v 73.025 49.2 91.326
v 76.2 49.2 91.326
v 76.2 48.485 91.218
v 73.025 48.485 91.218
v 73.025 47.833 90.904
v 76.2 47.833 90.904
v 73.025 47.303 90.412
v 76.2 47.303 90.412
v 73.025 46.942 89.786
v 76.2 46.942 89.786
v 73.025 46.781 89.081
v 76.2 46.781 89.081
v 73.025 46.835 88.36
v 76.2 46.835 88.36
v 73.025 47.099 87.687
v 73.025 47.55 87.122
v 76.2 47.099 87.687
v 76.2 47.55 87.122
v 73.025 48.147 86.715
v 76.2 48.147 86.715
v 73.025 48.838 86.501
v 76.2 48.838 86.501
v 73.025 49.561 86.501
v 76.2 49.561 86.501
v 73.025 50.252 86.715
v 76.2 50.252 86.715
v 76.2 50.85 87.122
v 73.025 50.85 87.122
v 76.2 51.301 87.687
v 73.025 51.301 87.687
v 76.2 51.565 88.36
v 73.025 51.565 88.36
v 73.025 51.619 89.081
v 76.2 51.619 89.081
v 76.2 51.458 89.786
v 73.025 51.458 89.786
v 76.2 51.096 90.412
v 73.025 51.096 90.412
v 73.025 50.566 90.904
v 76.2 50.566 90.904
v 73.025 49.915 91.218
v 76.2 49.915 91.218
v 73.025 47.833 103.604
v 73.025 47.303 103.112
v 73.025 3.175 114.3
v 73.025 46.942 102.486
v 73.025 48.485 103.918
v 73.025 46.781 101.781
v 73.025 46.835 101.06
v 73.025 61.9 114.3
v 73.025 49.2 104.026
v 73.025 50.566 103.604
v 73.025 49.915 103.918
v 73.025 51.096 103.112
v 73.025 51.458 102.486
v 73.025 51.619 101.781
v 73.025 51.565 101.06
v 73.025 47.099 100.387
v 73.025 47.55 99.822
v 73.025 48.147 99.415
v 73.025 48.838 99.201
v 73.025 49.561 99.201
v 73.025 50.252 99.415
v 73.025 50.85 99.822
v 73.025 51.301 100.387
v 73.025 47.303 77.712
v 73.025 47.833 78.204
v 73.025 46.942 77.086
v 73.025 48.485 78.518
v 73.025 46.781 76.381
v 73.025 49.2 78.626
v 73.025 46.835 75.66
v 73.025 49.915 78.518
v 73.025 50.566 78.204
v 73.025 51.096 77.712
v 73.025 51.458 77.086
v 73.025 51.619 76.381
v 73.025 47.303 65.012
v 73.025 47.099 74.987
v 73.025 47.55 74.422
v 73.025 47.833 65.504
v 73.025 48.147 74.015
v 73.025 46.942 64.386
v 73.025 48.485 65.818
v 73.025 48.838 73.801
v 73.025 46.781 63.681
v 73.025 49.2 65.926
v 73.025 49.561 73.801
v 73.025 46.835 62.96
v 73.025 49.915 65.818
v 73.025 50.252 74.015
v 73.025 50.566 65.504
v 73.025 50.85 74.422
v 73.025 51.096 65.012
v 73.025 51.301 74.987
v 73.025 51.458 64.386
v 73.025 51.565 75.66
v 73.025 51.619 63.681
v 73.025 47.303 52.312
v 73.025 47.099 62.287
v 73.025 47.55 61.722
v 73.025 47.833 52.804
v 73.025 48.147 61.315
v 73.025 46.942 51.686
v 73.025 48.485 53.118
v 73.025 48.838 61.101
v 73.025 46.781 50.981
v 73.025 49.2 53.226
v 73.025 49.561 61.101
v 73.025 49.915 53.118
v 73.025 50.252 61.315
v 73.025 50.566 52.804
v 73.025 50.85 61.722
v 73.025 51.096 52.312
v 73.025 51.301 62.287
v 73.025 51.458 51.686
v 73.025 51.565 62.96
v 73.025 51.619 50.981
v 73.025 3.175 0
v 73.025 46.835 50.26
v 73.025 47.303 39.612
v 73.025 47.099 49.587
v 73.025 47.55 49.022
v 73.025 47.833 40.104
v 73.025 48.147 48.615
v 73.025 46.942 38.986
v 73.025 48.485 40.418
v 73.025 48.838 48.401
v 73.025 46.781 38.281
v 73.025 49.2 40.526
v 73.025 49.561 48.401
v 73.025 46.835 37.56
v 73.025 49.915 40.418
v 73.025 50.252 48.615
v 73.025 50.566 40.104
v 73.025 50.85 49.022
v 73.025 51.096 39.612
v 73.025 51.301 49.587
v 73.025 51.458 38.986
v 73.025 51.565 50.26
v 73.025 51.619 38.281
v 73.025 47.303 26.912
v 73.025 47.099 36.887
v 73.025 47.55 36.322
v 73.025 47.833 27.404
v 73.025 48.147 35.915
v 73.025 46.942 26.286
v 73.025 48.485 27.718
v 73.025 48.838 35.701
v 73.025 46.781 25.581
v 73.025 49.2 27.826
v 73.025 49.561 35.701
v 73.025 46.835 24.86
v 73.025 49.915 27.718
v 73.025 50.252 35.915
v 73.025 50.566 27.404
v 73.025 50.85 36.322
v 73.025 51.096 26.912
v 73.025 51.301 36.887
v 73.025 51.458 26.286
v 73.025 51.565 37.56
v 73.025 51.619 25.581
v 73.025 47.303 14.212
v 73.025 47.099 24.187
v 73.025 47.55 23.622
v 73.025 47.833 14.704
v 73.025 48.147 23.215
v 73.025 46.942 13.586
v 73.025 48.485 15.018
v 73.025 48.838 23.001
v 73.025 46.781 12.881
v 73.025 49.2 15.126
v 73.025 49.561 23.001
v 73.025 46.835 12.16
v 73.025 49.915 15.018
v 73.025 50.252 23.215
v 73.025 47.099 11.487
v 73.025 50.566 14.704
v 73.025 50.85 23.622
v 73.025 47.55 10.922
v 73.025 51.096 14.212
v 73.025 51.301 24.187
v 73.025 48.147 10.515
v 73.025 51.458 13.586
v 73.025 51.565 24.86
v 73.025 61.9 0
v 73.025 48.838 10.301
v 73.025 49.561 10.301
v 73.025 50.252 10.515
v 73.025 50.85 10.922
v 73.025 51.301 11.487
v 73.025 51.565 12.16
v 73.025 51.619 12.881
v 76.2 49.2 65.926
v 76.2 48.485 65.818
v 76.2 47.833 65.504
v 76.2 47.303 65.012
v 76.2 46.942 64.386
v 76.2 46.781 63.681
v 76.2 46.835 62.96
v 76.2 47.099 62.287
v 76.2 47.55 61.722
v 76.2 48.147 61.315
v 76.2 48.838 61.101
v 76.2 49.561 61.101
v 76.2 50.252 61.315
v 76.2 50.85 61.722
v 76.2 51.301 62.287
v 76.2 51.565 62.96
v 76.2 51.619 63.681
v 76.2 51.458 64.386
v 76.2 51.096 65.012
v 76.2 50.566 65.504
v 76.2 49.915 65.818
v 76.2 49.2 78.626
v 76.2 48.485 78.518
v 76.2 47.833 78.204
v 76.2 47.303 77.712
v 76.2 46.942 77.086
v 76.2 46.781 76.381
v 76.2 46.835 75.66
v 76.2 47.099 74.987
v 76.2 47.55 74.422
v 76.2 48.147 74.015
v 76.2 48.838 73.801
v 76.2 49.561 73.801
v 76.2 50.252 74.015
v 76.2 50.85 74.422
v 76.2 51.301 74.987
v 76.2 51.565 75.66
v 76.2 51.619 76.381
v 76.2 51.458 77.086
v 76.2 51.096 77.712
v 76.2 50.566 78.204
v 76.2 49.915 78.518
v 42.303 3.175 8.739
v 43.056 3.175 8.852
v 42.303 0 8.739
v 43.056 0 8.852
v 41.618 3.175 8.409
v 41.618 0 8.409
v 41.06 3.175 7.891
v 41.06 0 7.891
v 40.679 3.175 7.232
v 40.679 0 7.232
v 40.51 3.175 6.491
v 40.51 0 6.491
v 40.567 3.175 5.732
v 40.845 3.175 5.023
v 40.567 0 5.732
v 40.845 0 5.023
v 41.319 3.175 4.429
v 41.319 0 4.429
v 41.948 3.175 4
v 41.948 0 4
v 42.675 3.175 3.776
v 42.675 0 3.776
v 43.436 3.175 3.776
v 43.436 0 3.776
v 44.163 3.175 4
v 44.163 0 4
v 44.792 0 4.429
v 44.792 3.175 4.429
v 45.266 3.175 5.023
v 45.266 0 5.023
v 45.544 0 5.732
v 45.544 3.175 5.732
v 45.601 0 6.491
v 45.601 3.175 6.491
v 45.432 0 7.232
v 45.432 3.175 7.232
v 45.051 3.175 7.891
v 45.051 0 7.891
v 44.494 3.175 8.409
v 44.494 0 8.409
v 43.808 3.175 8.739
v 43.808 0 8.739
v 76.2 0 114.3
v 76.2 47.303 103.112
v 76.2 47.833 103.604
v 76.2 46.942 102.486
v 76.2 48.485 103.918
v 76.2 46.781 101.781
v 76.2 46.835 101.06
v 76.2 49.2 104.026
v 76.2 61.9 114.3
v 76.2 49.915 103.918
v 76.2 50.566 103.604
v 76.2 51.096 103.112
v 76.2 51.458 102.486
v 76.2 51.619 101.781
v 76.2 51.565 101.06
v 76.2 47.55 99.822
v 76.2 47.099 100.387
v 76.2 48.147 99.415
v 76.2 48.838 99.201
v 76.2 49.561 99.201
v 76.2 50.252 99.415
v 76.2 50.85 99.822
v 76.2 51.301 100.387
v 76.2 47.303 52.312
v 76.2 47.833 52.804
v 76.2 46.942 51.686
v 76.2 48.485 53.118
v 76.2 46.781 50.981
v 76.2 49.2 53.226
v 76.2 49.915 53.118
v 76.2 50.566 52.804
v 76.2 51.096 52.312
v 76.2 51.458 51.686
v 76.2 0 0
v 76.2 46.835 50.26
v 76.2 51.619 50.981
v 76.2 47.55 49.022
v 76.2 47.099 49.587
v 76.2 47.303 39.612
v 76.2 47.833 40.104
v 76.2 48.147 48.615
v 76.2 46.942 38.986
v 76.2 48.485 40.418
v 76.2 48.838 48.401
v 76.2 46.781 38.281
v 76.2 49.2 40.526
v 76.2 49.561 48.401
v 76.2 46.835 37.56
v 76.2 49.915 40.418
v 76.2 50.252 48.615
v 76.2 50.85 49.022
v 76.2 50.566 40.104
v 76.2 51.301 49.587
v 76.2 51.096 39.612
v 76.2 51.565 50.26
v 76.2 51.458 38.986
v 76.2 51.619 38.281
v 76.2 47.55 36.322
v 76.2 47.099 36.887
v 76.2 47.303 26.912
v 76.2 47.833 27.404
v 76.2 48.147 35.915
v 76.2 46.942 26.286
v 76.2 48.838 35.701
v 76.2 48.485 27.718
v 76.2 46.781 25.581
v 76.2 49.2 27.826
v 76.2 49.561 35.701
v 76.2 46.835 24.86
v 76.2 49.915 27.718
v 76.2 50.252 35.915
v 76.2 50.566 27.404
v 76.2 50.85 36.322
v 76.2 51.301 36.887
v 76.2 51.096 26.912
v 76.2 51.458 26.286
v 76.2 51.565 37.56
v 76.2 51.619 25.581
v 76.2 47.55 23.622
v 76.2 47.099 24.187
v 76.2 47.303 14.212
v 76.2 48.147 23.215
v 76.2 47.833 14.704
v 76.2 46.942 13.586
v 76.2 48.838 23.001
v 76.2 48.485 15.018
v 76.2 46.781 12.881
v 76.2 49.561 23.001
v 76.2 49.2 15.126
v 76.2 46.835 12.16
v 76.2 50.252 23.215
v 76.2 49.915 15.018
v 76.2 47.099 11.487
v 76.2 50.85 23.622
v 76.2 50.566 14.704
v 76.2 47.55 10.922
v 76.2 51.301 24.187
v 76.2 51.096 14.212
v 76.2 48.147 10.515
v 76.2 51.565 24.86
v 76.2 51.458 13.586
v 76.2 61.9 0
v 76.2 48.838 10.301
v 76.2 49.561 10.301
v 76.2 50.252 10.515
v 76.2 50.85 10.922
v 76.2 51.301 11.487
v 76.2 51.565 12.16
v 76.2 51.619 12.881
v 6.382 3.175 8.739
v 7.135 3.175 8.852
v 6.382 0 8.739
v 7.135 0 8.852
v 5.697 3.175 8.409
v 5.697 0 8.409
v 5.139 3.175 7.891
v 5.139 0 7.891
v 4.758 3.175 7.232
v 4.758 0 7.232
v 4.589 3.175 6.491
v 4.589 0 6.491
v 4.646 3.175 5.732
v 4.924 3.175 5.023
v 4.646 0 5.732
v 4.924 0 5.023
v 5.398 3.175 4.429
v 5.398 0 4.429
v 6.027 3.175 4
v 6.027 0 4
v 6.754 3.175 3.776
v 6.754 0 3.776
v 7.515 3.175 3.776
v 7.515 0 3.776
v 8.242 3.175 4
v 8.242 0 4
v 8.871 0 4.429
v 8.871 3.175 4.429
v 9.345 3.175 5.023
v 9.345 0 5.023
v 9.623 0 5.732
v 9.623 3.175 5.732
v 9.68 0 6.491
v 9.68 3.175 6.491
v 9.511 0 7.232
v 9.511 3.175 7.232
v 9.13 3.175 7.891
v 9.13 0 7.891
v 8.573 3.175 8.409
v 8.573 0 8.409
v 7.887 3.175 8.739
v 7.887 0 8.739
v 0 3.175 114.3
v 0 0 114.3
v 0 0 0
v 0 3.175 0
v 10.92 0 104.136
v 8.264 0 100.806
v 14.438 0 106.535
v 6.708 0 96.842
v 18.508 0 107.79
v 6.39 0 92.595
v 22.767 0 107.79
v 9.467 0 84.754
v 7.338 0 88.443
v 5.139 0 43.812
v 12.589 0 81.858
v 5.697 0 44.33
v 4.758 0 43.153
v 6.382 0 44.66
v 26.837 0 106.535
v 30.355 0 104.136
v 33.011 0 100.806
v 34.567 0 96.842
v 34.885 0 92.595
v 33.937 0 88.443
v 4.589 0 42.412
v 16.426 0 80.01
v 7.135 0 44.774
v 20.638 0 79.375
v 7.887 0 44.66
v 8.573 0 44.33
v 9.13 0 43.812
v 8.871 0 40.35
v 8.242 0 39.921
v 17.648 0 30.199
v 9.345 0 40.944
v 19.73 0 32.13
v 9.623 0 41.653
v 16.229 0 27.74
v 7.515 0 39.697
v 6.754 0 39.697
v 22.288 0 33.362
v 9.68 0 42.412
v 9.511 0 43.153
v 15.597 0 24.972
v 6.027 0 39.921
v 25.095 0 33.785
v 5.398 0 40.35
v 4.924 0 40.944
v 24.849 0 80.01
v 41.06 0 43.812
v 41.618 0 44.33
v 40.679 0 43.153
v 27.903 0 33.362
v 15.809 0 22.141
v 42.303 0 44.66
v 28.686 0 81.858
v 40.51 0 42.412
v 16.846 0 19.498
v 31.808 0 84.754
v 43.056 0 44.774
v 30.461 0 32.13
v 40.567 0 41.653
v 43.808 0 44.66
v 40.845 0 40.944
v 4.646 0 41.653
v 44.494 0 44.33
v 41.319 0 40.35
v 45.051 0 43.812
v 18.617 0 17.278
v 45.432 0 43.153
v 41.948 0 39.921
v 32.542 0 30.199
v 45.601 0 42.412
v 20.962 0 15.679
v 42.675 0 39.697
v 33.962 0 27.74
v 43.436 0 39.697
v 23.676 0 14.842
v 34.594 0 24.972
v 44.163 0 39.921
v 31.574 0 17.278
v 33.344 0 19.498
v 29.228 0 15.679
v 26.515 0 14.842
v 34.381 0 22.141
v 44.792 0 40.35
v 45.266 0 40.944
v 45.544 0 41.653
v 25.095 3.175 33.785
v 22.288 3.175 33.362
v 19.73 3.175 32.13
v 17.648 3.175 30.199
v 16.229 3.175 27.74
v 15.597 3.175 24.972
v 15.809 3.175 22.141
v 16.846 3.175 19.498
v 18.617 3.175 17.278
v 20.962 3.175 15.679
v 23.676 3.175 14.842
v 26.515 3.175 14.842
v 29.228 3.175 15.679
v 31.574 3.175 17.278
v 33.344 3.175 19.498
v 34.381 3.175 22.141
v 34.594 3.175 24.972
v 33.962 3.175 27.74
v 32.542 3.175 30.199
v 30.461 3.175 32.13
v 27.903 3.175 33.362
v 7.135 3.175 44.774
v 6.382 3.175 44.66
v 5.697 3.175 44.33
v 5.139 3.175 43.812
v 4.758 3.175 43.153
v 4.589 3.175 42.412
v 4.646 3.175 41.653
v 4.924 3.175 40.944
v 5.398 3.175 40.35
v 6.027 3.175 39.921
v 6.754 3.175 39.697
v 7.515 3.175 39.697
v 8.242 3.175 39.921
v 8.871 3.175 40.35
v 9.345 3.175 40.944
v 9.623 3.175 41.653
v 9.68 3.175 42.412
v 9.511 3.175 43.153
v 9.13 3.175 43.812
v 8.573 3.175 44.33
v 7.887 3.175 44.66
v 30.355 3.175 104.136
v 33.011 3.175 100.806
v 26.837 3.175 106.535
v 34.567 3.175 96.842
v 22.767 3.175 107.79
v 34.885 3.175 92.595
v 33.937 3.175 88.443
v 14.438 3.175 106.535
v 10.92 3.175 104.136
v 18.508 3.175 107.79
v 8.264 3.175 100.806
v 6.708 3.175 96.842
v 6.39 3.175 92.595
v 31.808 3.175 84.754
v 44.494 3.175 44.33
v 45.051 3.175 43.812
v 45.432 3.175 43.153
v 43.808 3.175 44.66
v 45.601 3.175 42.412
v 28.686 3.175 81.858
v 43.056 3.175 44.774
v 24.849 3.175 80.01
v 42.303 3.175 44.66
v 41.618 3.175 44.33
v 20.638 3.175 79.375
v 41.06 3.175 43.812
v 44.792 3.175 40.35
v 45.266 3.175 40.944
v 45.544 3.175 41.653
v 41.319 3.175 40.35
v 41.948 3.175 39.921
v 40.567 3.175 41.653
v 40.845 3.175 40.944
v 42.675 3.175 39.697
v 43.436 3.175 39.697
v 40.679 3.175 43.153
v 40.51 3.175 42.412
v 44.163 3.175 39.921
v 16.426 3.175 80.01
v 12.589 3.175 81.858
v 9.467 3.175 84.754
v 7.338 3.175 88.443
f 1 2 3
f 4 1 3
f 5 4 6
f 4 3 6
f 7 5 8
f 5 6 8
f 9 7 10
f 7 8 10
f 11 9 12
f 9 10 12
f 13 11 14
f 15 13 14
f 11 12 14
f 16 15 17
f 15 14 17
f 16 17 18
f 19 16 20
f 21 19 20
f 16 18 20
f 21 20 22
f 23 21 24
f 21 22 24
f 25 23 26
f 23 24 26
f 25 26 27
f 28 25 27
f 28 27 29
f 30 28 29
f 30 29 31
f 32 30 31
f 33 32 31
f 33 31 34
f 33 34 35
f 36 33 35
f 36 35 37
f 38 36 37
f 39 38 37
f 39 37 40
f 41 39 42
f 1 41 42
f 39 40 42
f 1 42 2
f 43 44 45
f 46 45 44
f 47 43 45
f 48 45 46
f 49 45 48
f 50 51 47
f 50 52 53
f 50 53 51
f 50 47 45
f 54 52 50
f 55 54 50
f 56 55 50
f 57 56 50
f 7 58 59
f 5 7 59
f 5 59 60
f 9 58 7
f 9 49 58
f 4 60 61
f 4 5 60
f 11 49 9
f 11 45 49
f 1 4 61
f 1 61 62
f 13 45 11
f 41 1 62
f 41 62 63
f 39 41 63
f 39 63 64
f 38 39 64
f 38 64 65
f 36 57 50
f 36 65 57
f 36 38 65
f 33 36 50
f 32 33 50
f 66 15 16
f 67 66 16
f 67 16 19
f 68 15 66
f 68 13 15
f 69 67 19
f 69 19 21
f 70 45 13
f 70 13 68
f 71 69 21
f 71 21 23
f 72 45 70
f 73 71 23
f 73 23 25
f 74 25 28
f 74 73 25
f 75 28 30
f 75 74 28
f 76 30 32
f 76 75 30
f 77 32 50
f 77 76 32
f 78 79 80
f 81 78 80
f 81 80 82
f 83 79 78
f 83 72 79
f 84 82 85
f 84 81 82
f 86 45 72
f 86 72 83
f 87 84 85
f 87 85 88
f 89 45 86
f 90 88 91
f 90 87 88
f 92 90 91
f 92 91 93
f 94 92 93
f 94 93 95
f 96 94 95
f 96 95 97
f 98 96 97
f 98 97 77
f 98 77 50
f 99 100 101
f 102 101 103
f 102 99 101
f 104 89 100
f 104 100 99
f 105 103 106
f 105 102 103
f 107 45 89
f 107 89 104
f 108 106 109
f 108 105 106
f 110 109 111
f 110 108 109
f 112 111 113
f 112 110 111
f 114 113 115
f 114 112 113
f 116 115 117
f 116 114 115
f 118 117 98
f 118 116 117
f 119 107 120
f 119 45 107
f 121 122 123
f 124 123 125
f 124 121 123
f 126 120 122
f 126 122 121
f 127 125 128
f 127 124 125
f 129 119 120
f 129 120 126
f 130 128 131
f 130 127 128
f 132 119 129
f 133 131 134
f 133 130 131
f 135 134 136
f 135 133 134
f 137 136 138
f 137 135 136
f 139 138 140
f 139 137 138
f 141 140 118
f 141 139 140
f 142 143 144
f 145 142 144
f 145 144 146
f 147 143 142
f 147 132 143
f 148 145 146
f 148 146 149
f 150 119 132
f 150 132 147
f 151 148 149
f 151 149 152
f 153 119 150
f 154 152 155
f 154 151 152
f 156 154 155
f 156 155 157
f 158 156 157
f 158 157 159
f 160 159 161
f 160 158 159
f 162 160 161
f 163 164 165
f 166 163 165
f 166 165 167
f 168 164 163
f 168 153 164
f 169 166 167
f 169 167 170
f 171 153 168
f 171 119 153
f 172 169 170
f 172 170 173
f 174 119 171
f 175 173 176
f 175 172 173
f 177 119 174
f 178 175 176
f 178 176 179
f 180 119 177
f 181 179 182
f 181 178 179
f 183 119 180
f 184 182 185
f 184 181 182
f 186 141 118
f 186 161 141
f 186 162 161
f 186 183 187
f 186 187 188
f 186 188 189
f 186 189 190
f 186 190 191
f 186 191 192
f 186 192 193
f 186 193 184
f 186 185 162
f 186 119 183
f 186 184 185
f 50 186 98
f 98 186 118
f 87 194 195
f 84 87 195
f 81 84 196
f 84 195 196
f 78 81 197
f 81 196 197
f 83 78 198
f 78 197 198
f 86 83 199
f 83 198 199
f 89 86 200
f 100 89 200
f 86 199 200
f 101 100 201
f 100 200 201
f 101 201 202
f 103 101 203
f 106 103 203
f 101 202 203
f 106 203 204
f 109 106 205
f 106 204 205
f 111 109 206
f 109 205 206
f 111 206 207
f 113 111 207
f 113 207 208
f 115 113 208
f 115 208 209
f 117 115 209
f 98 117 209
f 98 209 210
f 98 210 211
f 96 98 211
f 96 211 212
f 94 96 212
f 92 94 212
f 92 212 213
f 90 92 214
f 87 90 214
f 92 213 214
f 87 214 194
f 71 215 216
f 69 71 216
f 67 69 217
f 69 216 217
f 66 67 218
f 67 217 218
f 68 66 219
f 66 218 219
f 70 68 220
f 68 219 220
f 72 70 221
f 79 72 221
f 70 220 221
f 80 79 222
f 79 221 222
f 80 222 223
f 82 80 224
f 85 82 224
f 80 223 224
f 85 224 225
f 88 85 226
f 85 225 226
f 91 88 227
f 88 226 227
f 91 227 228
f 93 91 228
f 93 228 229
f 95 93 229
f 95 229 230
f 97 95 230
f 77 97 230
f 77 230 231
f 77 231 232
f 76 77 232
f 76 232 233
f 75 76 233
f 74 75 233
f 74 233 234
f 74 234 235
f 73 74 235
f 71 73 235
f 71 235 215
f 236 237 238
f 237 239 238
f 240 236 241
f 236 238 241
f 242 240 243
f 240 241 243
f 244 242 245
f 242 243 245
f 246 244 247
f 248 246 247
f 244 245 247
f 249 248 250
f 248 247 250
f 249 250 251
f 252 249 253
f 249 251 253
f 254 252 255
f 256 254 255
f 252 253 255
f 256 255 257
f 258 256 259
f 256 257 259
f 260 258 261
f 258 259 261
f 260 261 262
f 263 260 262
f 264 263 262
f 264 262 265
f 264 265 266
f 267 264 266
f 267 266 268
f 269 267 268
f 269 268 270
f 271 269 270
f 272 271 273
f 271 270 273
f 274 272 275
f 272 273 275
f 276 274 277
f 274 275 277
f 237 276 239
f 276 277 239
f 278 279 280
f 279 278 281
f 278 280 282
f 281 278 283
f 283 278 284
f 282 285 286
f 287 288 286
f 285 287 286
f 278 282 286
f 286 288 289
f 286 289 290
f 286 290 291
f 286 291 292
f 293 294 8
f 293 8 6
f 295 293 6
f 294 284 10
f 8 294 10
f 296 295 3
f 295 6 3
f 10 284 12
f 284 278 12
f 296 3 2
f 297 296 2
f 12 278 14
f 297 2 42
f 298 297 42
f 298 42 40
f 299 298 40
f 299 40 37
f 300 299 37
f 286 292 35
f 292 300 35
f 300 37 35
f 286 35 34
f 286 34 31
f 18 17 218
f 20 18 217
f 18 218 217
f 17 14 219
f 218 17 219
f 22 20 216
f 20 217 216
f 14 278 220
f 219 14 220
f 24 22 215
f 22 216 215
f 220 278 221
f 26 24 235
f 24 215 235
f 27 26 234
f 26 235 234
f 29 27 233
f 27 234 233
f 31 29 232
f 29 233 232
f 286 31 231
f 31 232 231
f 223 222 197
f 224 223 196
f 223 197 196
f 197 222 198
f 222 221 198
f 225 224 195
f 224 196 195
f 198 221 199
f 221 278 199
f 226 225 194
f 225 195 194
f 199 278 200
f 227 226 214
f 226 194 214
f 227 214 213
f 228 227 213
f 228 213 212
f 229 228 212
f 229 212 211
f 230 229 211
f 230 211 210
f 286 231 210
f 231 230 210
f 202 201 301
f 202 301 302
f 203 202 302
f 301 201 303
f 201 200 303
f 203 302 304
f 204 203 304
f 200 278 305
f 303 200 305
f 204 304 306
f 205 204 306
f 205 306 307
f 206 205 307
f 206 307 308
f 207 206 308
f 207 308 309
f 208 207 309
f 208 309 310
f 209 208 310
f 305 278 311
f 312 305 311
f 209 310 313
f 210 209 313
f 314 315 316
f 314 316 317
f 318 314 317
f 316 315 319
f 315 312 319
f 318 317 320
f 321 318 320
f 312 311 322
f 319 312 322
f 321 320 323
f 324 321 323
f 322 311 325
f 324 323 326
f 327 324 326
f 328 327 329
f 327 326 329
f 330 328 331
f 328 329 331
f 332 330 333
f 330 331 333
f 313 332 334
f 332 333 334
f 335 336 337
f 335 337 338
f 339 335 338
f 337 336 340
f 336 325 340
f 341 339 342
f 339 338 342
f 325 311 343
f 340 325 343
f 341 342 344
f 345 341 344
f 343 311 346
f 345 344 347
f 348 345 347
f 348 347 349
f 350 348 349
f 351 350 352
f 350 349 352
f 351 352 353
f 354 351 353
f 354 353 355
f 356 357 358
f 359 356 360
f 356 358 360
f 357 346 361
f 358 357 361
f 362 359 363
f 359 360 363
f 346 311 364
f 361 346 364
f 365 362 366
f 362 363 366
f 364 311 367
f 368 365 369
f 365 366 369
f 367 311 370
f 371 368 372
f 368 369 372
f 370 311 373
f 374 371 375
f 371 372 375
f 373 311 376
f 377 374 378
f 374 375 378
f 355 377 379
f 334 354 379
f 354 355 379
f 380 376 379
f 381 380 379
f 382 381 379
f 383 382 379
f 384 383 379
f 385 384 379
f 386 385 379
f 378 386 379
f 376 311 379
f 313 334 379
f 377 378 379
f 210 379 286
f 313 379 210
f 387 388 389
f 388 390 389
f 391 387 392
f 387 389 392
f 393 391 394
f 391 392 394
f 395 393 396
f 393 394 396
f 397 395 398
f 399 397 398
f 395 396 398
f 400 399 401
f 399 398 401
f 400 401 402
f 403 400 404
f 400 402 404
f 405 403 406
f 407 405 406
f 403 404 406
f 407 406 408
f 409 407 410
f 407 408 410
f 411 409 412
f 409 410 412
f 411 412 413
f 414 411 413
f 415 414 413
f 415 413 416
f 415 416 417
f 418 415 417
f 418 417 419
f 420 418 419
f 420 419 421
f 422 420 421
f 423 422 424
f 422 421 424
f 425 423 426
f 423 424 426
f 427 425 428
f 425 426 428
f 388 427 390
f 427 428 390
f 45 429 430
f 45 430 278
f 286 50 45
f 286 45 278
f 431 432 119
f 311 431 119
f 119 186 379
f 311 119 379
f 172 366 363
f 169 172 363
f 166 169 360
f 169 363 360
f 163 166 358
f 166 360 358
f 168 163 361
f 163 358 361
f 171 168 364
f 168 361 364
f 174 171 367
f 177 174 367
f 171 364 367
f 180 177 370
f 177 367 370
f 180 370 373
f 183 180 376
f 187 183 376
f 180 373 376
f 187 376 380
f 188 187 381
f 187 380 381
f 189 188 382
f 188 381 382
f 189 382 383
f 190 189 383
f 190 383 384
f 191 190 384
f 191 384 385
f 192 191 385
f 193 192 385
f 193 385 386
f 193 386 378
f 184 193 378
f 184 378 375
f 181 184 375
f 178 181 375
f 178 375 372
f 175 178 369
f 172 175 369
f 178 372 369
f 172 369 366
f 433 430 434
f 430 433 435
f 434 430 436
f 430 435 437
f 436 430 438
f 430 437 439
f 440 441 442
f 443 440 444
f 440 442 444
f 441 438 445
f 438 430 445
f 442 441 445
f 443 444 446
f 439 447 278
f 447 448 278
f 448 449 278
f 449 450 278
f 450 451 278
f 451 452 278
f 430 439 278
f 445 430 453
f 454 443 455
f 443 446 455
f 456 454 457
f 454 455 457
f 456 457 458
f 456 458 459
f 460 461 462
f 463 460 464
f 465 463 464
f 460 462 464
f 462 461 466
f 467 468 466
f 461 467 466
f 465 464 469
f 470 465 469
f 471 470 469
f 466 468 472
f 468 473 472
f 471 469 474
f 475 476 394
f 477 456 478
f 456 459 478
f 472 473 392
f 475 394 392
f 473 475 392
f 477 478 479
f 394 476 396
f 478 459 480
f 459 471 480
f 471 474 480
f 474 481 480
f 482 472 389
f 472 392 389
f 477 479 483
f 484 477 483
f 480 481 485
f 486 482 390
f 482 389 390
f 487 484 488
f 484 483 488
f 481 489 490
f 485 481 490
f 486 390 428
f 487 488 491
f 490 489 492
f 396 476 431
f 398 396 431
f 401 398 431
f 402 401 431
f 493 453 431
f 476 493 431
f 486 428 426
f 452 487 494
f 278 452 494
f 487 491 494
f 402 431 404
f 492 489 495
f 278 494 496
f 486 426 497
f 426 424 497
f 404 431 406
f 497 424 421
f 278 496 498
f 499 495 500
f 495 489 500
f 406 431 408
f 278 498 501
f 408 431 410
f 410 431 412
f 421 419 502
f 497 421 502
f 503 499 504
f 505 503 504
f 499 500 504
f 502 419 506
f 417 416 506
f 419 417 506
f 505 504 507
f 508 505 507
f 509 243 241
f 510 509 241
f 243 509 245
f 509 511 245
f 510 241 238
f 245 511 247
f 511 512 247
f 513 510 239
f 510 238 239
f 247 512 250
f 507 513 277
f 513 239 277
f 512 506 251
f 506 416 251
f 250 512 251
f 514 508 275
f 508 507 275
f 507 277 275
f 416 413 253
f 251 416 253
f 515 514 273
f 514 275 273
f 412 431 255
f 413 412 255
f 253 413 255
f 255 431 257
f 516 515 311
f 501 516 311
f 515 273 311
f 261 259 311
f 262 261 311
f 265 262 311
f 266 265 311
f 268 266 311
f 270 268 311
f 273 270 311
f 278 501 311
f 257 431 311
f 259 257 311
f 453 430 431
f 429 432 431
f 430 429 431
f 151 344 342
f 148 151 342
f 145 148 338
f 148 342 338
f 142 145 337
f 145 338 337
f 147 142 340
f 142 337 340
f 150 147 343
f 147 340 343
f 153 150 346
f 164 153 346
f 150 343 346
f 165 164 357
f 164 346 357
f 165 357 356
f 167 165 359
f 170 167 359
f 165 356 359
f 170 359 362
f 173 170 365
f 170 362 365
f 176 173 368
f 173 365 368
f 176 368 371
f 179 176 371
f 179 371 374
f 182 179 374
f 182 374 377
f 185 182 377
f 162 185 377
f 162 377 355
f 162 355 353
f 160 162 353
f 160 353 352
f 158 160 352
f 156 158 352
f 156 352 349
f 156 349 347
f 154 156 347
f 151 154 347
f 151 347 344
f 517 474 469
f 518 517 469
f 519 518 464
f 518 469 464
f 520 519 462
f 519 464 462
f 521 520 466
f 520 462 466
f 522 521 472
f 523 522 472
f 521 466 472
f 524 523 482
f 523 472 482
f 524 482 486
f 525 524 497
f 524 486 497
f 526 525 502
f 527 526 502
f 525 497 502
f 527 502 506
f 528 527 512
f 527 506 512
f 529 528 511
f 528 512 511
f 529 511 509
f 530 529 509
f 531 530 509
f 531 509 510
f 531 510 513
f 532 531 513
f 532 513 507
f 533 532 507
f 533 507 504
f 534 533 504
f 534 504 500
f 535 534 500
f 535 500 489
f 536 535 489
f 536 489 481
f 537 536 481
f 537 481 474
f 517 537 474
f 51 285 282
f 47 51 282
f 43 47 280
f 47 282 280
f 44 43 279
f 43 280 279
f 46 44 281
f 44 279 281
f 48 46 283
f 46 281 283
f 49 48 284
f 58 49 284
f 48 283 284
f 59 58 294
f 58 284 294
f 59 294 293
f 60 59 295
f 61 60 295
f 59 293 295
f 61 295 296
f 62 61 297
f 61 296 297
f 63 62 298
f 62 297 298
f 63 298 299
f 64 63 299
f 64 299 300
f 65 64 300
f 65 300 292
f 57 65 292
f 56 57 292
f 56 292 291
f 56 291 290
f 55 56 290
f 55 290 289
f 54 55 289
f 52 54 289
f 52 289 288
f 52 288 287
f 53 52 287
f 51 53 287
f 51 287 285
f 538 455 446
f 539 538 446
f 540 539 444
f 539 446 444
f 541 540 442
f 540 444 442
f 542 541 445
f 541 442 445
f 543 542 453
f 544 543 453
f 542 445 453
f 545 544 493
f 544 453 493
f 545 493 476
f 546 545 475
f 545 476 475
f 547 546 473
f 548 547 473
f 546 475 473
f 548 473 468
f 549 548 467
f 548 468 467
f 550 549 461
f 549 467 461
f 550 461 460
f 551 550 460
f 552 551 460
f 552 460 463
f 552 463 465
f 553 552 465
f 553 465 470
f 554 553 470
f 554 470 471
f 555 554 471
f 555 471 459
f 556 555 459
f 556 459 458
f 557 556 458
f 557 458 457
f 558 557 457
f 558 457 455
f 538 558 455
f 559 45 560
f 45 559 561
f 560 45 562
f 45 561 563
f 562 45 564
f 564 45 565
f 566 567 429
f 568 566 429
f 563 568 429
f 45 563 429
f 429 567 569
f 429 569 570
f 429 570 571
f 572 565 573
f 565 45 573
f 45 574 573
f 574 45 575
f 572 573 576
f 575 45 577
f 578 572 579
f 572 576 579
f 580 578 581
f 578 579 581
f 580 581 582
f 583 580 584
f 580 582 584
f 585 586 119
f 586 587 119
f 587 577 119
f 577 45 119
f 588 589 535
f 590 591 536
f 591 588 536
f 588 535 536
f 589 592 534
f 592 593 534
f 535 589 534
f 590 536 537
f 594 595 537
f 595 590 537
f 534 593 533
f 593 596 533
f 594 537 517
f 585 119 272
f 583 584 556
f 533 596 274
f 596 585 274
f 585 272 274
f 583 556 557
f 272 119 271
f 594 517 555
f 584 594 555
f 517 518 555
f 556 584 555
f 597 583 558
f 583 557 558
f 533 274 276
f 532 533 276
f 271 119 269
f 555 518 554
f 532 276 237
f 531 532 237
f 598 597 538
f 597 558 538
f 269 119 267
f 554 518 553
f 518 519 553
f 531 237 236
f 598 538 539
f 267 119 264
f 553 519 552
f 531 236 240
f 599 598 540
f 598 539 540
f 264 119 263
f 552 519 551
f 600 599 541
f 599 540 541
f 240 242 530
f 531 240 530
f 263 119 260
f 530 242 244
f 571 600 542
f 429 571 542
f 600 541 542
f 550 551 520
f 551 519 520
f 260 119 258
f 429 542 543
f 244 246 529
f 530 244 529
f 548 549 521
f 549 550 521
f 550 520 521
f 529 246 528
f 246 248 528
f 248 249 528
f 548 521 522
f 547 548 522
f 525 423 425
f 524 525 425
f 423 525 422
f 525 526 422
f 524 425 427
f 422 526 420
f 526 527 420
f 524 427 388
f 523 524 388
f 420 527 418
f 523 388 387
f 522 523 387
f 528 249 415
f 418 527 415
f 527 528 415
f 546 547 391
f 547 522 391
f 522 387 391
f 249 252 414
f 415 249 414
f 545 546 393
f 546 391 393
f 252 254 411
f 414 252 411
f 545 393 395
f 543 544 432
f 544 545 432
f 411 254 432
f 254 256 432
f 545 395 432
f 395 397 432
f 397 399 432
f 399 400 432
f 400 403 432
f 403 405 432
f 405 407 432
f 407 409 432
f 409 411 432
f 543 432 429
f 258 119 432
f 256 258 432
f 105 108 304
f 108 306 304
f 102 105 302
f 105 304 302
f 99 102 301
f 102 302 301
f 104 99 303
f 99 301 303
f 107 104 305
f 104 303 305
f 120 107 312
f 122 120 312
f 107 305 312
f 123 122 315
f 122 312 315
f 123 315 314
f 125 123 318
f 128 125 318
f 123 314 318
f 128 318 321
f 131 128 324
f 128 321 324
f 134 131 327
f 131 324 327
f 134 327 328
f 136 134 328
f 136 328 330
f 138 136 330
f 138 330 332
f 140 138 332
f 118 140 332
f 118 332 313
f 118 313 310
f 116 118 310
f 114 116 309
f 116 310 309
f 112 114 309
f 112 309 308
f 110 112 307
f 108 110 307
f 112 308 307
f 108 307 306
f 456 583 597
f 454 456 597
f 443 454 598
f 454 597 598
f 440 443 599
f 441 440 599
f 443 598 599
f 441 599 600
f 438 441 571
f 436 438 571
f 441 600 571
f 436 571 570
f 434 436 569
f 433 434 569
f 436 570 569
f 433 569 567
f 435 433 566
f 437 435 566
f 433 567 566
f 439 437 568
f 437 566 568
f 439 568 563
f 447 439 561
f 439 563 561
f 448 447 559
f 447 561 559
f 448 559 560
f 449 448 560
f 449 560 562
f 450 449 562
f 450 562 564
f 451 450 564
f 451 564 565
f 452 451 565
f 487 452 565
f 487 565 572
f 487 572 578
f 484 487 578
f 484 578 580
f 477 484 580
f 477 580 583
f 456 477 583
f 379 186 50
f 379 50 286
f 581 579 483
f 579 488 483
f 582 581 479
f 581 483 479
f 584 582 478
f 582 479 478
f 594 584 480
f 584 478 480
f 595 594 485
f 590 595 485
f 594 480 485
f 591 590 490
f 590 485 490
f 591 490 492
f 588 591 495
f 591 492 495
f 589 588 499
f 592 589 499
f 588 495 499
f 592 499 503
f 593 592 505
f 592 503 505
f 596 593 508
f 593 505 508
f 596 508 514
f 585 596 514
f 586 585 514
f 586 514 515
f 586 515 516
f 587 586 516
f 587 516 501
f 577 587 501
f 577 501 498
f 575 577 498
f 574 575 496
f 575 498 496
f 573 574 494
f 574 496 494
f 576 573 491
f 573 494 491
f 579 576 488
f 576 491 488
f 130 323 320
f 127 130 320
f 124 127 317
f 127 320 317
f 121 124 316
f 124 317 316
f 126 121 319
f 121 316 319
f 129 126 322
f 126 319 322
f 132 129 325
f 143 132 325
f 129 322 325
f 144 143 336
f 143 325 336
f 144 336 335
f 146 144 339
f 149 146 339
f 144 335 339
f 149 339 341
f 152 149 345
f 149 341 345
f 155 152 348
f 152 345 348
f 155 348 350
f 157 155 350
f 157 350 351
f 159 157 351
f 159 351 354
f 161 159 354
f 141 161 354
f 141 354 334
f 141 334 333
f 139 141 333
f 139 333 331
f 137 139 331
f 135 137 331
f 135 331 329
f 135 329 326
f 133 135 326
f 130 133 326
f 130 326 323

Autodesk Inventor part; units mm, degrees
ref_plane "YZ Plane" through (0, 0, 0) normal (1, 0, 0) x (0, 1, 0)
ref_plane "XZ Plane" through (0, 0, 0) normal (0, 1, 0) x (-1, 0, 0)
ref_plane "XY Plane" through (0, 0, 0) normal (0, 0, 1) x (1, 0, 0)
sketch "Sketch1" plane through (0, 0, 0) normal (0, 0, 1) x (1, 0, 0)
  line L0 (0, 0) -> (76.2, 0)
  line L1 (76.2, 0) -> (76.2, 76.2)
  line L2 (76.2, 76.2) -> (0, 76.2)
  line L3 (0, 3.175) -> (0, 0)
  line L4 (3.175, 3.175) -> (73.025, 3.175)
  line L5 (73.025, 3.175) -> (73.025, 73.025)
  line L6 (3.175, 3.175) -> (0, 3.175)
  line L7 (73.025, 73.025) -> (73.025, 76.2)
  dimension "d0" = 76.2
  dimension "d1" = 76.2
extrude "Extrusion1" add sketch "Sketch1" along normal blind 114.3
sketch "Sketch2" plane through (0, 0, 0) normal (0, -1, 0) x (1, 0, 0)
  line L0 (0, 114.3) -> (76.2, 114.3) projected
  line L1 (0, 0) -> (0, 114.3) projected
  point P0 (20.6375, 93.6625)
  dimension "d5" = 20.6375
  dimension "d6" = 20.6375
  dimension "d14" = 114.3
hole "Hole1" at (20.6375, 0, 93.6625) direction (0, 1, 0) diameter 28.575 depth 25.4 tip angle 118
sketch "Sketch3" plane through (0, 3.175, 0) normal (0, 1, 0) x (1, 0, 0)
  circle A0 centre (20.6375, -93.6625) radius 14.2875 projected
  line L0 (0, 0) -> (0, -114.3) projected
  line L1 (47.625, 18.9706) -> (73.025, 18.9706) construction
  line L2 (73.025, 18.9706) -> (73.025, -101.6) construction
  line L3 (73.025, -101.6) -> (47.625, -101.6) construction
  line L4 (47.625, -101.6) -> (47.625, 18.9706) construction
  line L5 (73.025, 0) -> (73.025, -114.3) construction
  circle A1 centre (25.0952, -24.2603) radius 17.4498 construction
  dimension "d27" = 69.5452
  dimension "d28" = 25.4
  dimension "d29" = 34.8996
  dimension "d30" = 22.5298
hole "Hole2" at (25.0952, 3.175, 24.2603) direction (0, -1, 0) diameter 19.05 depth 25.4 tip angle 118
sketch "Sketch4" plane through (0, 3.175, 0) normal (0, 1, 0) x (1, 0, 0)
  line L0 (0, 0) -> (0, -114.3) projected
  circle A0 centre (25.0952, -24.2603) radius 25.4
  line L1 (-11.821, -6.2998) -> (92.2522, -6.2998) construction
  circle A1 centre (25.0952, -24.2603) radius 7.9375
  circle A2 centre (25.0952, -24.2603) radius 9.525 projected
  point P0 (7.1347, -6.2998)
  point P1 (7.1347, -42.2208)
  point P2 (43.0557, -42.2208)
  point P3 (43.0557, -6.2998)
  dimension "d39" = 50.8
  dimension "d42" = 360
hole "Hole3" at (7.1347, 3.175, 6.2998) at (43.0557, 3.175, 6.2998) at (43.0557, 3.175, 42.2208) at (7.1347, 3.175, 42.2208) direction (0, -1, 0) diameter 5.1054 depth 25.4 tip angle 118 clearance for "Flat Head Machine Screw (82)" size "#10" standard "Ansi Unified Screw Threads"
sketch "Sketch5" plane through (0, 0, 0) normal (0, 0, -1) x (-1, 0, 0)
  line L0 (-47.7073, 61.8998) -> (-105.1568, 61.8998)
  line L1 (-105.1568, 61.8998) -> (-105.1568, 87.3508)
  line L2 (-105.1568, 87.3508) -> (-47.7073, 87.3508)
  line L3 (-47.7073, 87.3508) -> (-47.7073, 61.8998)
  line L4 (-76.2, 76.2) -> (-73.025, 76.2) projected
  point P0 (0, 0)
  dimension "d44" = 14.3002
extrude "Extrusion2" cut sketch "Sketch5" against normal through all
sketch "Sketch6" plane through (73.025, 3.175, 0) normal (-1, 0, 0) x (0, 0, 1)
  line L0 (114.3, 58.7248) -> (0, 58.7248) projected
  line L1 (114.3, 58.7248) -> (114.3, 0) projected
  line L2 (0, 58.7248) -> (0, 0) projected
  point P0 (0, -3.175)
  point P1 (101.6, 46.0248)
  point P2 (88.9, 46.0248)
  point P3 (76.2, 46.0248)
  point P4 (63.5, 46.0248)
  point P5 (50.8, 46.0248)
  point P6 (38.1, 46.0248)
  point P7 (25.4, 46.0248)
  point P8 (12.7, 46.0248)
  dimension "d47" = 12.7
  dimension "d48" = 12.7
  dimension "d49" = 12.7
  dimension "d50" = 12.7
  dimension "d51" = 12.7
  dimension "d52" = 12.7
  dimension "d53" = 12.7
  dimension "d54" = 12.7
  dimension "d55" = 12.7
  dimension "d56" = 12.7
  dimension "d57" = 12.7
  dimension "d58" = 12.7
  dimension "d59" = 12.7
  dimension "d60" = 12.7
  dimension "d61" = 12.7
  dimension "d62" = 12.7
hole "Hole4" at (73.025, 49.1998, 101.6) at (73.025, 49.1998, 88.9) at (73.025, 49.1998, 76.2) at (73.025, 49.1998, 63.5) at (73.025, 49.1998, 50.8) at (73.025, 49.1998, 38.1) at (73.025, 49.1998, 25.4) at (73.025, 49.1998, 12.7) direction (1, 0, 0) diameter 4.8514 end through all
equation "\"d5\" = d6"
properties part number "ARM_067_NewLongShaftMount" material "Aluminum 6061"
